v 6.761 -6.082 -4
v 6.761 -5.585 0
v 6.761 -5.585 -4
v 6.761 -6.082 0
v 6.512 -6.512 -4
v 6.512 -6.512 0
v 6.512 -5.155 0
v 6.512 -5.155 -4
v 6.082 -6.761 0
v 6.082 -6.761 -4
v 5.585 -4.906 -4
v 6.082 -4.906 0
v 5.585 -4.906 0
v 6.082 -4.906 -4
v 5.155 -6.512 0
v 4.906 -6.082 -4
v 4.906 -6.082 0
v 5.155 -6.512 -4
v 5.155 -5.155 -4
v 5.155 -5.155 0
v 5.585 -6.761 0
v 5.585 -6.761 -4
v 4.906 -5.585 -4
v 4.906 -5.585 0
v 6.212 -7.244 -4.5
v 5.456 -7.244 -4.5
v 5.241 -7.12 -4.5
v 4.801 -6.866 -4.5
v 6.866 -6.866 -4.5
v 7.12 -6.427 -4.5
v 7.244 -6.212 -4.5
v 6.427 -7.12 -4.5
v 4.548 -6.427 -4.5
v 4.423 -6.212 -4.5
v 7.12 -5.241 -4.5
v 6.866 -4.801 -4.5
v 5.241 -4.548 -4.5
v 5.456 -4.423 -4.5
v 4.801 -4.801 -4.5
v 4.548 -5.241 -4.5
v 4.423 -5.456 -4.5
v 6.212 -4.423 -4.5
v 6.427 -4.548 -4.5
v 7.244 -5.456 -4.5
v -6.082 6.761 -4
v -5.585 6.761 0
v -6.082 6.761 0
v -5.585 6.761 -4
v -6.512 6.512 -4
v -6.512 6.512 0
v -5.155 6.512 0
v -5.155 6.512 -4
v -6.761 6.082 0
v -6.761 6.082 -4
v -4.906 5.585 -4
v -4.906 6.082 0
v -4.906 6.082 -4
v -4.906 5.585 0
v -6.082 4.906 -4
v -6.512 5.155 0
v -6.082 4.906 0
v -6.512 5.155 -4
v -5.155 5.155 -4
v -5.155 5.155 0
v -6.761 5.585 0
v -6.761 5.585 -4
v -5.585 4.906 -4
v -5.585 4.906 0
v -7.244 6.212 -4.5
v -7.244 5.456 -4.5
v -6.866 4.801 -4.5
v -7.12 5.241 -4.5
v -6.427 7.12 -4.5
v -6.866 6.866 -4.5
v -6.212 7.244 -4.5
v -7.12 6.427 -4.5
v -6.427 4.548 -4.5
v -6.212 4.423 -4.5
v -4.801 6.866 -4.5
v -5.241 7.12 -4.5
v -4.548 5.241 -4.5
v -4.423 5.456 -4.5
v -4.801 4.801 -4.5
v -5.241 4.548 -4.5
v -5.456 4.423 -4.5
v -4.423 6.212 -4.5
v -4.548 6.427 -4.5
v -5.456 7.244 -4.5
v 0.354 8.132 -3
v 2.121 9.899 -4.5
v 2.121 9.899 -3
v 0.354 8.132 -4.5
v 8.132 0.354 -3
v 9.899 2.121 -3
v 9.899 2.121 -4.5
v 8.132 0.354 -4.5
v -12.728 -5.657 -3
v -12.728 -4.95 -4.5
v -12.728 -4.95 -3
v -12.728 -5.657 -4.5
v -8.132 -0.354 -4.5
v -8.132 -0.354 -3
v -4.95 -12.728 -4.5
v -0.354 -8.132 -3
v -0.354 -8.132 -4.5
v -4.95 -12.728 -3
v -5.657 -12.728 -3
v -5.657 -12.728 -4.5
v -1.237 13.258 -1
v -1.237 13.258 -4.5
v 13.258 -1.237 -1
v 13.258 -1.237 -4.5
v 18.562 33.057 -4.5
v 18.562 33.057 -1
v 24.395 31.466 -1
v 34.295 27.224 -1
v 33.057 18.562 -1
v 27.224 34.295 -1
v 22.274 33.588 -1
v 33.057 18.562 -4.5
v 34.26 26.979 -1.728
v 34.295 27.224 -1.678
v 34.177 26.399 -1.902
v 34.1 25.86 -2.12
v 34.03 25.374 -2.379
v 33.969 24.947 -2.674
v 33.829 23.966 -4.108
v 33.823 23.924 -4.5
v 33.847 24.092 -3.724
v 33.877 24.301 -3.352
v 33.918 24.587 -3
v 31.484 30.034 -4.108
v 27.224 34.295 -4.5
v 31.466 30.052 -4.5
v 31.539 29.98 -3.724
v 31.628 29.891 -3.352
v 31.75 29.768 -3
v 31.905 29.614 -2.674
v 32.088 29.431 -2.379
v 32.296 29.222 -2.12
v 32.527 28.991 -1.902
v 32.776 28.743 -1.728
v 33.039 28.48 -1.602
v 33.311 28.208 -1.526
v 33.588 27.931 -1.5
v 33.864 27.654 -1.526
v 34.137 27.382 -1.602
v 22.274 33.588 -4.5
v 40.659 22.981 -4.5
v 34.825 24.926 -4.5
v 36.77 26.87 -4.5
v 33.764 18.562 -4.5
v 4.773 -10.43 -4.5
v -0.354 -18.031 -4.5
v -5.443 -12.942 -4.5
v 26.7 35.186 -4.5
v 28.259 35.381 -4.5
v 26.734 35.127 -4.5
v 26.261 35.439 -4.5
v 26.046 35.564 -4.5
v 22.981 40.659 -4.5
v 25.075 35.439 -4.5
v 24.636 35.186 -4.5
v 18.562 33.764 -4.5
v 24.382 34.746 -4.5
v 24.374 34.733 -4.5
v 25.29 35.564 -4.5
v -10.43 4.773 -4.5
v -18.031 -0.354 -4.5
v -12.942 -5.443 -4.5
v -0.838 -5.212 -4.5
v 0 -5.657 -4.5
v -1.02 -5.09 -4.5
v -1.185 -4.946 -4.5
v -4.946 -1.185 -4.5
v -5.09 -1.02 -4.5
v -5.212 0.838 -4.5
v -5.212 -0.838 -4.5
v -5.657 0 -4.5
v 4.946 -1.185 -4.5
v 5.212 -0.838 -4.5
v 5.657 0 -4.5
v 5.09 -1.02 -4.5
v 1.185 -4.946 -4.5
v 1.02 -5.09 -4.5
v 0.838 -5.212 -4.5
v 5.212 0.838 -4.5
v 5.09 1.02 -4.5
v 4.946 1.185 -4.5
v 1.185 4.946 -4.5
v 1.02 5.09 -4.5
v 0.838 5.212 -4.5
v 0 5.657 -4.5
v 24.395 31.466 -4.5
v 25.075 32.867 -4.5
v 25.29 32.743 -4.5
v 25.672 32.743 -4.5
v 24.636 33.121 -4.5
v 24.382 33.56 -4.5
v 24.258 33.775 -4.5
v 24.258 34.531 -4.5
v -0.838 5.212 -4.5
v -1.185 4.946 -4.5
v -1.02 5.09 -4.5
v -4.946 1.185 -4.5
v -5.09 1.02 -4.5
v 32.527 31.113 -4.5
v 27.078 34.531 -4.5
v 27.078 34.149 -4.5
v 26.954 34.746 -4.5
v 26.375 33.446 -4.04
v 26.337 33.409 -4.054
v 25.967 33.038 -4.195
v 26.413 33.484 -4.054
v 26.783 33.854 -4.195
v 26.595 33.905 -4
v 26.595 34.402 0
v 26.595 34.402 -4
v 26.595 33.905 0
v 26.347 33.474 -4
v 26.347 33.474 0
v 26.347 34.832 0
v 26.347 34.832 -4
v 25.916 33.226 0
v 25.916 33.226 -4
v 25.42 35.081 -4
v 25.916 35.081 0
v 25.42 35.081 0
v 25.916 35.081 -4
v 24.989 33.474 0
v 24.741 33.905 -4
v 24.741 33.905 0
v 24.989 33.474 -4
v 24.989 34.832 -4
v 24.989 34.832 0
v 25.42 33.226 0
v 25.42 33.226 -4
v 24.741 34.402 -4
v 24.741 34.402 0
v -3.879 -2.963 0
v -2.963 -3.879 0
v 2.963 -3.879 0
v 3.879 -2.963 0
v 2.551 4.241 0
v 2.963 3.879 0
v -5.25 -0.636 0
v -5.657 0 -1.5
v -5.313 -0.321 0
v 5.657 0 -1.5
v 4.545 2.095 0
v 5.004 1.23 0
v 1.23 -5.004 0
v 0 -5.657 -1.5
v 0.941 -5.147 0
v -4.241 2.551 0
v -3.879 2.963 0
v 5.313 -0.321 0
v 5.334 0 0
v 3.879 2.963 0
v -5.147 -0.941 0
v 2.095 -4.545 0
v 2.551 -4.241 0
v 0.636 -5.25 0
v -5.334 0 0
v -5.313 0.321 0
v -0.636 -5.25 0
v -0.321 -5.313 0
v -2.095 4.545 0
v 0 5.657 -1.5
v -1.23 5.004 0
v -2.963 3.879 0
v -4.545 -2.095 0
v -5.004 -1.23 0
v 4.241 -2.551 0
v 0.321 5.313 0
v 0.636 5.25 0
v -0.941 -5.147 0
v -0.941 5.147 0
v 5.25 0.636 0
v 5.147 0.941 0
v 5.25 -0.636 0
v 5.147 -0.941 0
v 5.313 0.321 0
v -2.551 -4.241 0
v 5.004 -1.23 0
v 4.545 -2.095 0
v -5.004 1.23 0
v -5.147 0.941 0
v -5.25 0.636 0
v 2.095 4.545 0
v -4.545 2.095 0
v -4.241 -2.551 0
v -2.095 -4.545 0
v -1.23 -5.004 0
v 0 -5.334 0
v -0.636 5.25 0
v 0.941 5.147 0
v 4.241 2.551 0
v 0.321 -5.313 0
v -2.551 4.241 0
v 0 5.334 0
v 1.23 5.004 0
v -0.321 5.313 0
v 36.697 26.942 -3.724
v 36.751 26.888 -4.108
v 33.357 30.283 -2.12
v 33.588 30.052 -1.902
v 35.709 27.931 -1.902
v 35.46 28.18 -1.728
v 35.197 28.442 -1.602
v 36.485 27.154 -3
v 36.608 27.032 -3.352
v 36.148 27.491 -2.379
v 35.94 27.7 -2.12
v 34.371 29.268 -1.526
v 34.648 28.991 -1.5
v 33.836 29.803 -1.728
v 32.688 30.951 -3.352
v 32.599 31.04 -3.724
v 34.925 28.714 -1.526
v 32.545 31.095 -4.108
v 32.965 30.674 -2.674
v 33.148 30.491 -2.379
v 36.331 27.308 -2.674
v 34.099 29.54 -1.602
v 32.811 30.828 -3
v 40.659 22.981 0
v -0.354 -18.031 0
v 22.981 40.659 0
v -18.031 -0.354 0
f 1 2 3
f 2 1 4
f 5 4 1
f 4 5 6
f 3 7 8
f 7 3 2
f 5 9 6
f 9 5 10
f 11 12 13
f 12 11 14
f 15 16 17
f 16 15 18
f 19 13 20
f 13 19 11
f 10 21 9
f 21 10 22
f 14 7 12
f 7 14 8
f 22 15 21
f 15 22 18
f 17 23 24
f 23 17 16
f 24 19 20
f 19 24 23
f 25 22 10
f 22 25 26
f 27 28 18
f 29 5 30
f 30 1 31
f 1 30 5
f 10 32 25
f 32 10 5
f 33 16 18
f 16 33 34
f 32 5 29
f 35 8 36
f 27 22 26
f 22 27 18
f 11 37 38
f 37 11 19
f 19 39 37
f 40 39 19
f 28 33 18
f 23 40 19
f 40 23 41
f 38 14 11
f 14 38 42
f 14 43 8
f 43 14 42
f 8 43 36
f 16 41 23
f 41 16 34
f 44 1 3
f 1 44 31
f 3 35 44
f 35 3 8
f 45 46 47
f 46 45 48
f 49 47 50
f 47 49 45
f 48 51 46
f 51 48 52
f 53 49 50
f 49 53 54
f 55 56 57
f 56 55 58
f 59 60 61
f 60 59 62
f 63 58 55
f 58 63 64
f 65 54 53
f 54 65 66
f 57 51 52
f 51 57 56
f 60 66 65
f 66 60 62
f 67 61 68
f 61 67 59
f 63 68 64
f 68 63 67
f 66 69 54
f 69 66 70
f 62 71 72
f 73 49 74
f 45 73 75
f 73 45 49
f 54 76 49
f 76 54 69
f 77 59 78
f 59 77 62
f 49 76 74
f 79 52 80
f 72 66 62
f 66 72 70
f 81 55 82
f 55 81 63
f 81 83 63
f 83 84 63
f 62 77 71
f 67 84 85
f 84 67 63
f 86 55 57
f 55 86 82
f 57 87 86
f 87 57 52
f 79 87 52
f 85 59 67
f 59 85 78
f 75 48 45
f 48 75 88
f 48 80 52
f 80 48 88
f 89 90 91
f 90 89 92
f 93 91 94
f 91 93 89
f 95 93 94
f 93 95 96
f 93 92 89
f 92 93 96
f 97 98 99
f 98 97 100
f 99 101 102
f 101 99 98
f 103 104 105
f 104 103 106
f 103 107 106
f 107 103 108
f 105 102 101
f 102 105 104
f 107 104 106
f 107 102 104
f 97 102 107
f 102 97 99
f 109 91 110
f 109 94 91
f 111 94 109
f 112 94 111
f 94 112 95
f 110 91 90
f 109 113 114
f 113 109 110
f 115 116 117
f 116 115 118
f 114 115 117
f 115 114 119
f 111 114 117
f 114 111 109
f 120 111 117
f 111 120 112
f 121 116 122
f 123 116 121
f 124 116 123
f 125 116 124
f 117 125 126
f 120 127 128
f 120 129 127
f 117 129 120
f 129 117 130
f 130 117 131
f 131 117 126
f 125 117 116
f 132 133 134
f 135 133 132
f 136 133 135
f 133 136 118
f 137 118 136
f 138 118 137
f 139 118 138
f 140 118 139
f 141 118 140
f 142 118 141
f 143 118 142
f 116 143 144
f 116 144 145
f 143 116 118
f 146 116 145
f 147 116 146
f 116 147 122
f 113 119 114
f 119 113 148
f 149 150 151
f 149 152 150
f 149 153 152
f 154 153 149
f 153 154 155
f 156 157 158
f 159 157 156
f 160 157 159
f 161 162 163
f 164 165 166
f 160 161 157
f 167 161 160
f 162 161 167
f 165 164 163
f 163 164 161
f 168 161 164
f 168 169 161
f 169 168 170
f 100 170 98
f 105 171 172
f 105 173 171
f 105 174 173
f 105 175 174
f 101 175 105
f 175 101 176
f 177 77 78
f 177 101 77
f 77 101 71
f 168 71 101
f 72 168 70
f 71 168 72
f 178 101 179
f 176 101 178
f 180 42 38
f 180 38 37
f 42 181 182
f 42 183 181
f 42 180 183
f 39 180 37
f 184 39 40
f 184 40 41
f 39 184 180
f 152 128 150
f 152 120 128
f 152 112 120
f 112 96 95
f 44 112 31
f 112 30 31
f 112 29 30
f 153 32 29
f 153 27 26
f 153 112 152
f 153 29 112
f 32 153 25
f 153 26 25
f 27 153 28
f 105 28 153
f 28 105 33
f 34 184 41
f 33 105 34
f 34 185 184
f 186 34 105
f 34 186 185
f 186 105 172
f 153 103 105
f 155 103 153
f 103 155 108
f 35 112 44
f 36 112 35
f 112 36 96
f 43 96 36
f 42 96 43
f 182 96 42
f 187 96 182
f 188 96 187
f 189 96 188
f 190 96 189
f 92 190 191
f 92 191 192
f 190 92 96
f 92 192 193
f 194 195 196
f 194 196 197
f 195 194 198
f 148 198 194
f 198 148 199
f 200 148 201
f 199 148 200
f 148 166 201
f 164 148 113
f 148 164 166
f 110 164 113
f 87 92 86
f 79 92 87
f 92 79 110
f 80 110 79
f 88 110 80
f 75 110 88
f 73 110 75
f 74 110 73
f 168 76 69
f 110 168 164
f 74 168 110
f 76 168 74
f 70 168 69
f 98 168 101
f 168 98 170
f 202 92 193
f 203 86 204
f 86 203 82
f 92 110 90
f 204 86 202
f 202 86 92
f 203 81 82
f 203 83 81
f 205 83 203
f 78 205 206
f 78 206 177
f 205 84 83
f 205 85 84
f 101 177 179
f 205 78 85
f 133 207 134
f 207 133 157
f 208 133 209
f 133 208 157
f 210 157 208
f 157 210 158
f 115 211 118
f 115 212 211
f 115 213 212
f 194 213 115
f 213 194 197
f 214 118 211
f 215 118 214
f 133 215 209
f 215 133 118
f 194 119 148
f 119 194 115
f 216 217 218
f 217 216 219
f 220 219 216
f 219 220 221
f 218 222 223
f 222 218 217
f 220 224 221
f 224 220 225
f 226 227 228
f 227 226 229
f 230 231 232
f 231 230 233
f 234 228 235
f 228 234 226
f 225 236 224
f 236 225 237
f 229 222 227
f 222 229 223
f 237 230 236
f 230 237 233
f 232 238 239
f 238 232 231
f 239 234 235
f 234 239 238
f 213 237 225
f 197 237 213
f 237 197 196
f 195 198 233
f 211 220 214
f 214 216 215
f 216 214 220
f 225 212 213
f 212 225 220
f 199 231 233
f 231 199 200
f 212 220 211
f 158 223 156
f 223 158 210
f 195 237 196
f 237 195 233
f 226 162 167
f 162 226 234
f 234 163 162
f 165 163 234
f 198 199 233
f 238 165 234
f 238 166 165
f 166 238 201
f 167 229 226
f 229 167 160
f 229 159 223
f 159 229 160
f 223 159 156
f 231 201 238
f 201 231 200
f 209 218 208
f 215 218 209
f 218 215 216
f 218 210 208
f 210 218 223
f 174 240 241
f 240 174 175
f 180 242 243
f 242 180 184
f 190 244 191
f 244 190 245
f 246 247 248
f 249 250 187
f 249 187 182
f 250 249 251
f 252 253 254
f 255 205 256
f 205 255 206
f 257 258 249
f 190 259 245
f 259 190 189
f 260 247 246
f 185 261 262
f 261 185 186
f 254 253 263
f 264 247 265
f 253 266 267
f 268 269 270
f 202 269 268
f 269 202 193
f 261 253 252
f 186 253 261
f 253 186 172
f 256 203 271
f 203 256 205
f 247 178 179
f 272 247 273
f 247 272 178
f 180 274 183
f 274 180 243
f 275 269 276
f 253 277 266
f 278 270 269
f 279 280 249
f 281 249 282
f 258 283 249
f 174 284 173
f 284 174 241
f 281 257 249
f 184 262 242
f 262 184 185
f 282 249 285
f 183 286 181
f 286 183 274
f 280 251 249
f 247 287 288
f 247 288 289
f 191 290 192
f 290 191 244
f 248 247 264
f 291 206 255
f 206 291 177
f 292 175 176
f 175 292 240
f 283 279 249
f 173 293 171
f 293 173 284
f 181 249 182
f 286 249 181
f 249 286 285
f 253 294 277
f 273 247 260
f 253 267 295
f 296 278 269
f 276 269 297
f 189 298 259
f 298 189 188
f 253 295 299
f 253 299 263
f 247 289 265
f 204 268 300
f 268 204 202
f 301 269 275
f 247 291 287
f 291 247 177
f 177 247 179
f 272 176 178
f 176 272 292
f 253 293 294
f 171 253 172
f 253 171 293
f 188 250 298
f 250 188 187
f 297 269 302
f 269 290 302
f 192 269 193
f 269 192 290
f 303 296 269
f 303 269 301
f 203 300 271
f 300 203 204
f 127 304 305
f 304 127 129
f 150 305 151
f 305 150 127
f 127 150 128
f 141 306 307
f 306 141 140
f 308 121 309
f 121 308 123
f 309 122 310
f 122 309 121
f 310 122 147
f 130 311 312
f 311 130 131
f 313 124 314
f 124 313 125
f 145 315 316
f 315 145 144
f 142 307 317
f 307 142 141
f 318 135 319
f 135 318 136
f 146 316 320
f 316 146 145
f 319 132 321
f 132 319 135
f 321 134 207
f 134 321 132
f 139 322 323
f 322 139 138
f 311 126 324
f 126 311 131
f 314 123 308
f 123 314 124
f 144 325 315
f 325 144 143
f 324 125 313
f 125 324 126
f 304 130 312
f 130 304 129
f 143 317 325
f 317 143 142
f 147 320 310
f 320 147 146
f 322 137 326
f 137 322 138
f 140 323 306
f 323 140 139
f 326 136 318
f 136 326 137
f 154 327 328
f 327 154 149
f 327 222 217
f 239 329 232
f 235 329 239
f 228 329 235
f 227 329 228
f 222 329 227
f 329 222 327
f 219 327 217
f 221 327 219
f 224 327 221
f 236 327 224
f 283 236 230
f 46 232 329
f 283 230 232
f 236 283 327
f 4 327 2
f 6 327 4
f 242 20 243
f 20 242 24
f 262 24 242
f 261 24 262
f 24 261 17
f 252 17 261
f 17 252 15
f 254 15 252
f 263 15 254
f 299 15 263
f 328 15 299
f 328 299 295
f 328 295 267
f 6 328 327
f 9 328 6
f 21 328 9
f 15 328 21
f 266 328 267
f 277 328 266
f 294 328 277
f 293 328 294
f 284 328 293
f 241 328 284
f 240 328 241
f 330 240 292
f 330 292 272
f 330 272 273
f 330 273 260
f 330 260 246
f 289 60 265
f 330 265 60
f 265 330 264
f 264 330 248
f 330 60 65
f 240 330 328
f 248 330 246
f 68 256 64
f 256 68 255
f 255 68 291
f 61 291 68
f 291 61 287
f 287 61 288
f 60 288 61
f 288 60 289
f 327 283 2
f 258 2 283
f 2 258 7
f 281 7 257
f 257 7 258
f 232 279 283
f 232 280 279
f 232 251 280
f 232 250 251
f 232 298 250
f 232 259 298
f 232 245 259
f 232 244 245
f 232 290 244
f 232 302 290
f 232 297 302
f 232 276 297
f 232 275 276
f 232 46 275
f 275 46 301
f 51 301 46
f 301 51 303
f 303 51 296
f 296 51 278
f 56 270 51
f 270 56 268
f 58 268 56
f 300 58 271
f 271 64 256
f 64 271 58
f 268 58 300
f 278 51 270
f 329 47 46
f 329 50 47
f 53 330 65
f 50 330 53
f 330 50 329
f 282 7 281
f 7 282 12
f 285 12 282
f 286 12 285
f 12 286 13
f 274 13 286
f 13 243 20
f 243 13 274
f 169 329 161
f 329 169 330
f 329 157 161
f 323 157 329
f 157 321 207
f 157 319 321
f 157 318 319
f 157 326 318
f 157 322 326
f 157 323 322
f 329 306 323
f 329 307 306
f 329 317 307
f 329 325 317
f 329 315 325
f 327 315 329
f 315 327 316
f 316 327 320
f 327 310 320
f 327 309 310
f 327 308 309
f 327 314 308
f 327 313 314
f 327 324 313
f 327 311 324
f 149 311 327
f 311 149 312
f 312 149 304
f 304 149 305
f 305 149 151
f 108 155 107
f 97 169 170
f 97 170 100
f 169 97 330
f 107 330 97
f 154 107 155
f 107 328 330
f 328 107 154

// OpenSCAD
/******************************************************************
*                                                                 *
* OpenFlexure Microscope: Logitech C270 screw-on-from-bottm mount *
*                                                                 *
* This is part of the OpenFlexure microscope, an open-source      *
* microscope and 3-axis translation stage.  It gets really good   *
* precision over a ~10mm range, by using plastic flexure          *
* mechanisms.                                                     *
*                                                                 *
* This file defines a camera mount (together with functions that  *
* return the mount height and sensor position) for the Logitech   *
* C270 webcam.                                                    *
*                                                                 *
*                                                                 *
* (c) Richard Bowman, January 2016                                *
* Released under the CERN Open Hardware License                   *
*                                                                 *
******************************************************************/


use <../utilities.scad>;



$fn=48;
d=0.05;


function c270_camera_mount_height() = 4.5;
bottom = c270_camera_mount_height() * -1;
function c270_camera_sensor_height() = 0.2; //Height of the sensor above the PCB

module mounting_hole(){
    translate([0,0,-5]) cylinder(r=0.8*1.2,h=999,$fn=12); 
    translate([0,0,-0.5]) cylinder(r1=0.8*1.2,h=1,r2=0.8*1.2+1,$fn=12);
}

module C270(beam_r=5, beam_h=6){
    //cut-out to fit logitech C270 webcam
    //optical axis at (0,0)
    //top of PCB at (0,0,0)
    mounting_hole_x = 8.25;
    mirror([0,0,1]){ //parts cut out of the mount are z<0
        //beam clearance
        hull(){
            cube([8,8,6],center=true);
            translate([0,0,-beam_h]) cylinder(r=beam_r,h=2*d,center=true);
        }

        //mounting holes
        reflect([1,0,0]) translate([mounting_hole_x,0,0]) mounting_hole(); 
        
        //clearance for PCB
        translate([0,0,0]){
            hull(){
                translate([-10/2,-13.5,0]) cube([10,d,8]);
                translate([-21.5/2,-4,0]) cube([21.5,41,8]);
                translate([-10/2,45,0]) cube([10,d,8]);
            }
            reflect([0,1,0]) hull(){
                translate([-4.5,6,-1.5]) cube([9,7.5,8]);
                translate([-5.5,6,-1.5]) cube([11,6.5,8]);
            }
            difference(){
                hull(){
                    translate([0,22.5,0+4]) cube([20.5,28,15],center=true);
                    translate([0,34,0+4]) cube([10,9.5*2,15],center=true);
                }
                translate([-5,39.5,-999]) mirror([1,0,0]) cube([999,999,999]);
            }
            translate([-6,42.3,0]) mounting_hole();
        }
        
        //exit for cable
        translate([4,20,0]) rotate([-90,0,0]) cylinder(r=3,h=99);
    }
}

module c270_camera_mount(){
    // A mount for the pi camera v2
    // This should finish at z=0+d, with a surface that can be
    // hull-ed onto the lens assembly.
    h = 58;
    w = 25;
    rotate(-45) difference(){
        translate([-w/2, -13, bottom]) cube([w, h, c270_camera_mount_height()]);
        translate([0,0,bottom]) C270();
    }
}
c270_camera_mount();
